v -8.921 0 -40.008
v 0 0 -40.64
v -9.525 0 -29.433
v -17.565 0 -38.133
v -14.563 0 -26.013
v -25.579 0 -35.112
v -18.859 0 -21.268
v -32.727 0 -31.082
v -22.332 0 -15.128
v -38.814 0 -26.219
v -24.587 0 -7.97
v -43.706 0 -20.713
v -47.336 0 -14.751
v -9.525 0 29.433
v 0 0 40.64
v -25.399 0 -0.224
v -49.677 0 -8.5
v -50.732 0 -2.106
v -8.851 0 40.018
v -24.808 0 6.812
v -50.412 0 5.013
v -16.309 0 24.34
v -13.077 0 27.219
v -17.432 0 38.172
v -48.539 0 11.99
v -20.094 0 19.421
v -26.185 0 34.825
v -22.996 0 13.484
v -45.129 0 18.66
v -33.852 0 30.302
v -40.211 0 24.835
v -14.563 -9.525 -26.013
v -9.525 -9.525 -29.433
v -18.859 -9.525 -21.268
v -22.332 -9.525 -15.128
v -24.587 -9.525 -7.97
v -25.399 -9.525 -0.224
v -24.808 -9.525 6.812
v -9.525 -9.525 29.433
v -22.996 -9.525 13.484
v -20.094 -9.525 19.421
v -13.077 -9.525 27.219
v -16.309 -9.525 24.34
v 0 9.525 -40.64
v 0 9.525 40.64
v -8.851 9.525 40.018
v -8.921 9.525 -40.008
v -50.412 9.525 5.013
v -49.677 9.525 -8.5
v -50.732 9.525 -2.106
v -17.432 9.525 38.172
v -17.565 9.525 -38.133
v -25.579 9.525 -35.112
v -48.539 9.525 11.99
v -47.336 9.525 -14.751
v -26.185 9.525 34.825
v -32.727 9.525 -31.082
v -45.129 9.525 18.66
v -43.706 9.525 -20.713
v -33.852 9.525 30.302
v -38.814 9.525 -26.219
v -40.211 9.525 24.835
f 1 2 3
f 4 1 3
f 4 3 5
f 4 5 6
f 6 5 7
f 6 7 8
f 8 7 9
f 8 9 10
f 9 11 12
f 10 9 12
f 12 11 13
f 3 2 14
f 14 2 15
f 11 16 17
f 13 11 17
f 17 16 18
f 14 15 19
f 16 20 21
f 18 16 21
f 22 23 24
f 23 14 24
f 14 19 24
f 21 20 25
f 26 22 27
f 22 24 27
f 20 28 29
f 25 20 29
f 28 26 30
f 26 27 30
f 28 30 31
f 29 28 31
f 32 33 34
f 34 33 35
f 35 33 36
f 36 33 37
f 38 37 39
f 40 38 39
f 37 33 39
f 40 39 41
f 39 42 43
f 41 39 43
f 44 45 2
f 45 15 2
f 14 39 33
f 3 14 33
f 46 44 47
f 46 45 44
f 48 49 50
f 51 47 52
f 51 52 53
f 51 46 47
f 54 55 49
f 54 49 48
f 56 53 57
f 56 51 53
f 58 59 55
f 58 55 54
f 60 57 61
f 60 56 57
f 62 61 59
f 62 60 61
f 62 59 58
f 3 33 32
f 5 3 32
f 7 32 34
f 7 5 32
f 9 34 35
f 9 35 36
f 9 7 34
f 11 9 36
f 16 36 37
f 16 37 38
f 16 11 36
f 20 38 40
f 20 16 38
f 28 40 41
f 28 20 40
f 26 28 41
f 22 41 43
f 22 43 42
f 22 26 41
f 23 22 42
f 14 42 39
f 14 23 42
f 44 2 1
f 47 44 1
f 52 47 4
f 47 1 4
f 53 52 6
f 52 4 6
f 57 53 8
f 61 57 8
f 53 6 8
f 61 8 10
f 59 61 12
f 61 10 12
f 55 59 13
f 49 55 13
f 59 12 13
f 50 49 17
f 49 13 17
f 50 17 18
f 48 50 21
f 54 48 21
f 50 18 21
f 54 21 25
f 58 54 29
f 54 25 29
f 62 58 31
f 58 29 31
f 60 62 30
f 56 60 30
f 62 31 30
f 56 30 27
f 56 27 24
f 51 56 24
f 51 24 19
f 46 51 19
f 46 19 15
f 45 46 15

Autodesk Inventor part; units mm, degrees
ref_plane "YZ Plane" through (0, 0, 0) normal (1, 0, 0) x (0, 1, 0)
ref_plane "XZ Plane" through (0, 0, 0) normal (0, 1, 0) x (-1, 0, 0)
ref_plane "XY Plane" through (0, 0, 0) normal (0, 0, 1) x (1, 0, 0)
sketch "Sketch1" plane through (0, 0, 0) normal (0, 1, 0) x (-1, 0, 0)
  ellipse E0 centre (0, 0) end of major axis (0, -40.64) minor radius 50.8 (0, -40.64) -> (0, 40.64) ccw
  line L0 (0, 40.64) -> (0, -40.64)
  ellipse E1 centre (0, 0) end of major axis (0, -31.75) minor radius 25.4 (0, -31.75) -> (0, 31.75) ccw
  line L1 (0, 40.64) -> (0, -40.64)
  point P0 (0, -31.75)
  point P1 (0, 31.75)
  dimension "d0" = 50.8
  dimension "d1" = 40.64
  dimension "d2" = 25.4
  dimension "d3" = 31.75
extrude "Extrusion1" add sketch "Sketch1" along normal blind 9.525
extrude "Extrusion2" add sketch "Sketch1" against normal blind 9.525 contours L0 E1
sketch "Sketch3" plane through (0, -9.525, 0) normal (0, -1, 0) x (1, 0, 0)
  line L0 (0, -31.75) -> (0, 31.75) projected
  ellipse E0 centre (0, 0) end of major axis (0, -31.75) minor radius 25.4 (0, 31.75) -> (0, -31.75) ccw projected
  line L1 (0, 40.64) -> (0, -40.64) projected
  ellipse E1 centre (0, 0) end of major axis (0, -31.75) minor radius 25.4 (0, 31.75) -> (0, -31.75) ccw projected
  line L2 (-9.525, 29.433) -> (-9.525, -29.433)
  ellipse E2 centre (0, 0) end of major axis (0, -31.75) minor radius 25.4 (0, 31.75) -> (-9.525, 29.433) ccw
  ellipse E3 centre (0, 0) end of major axis (0, -31.75) minor radius 25.4 (-9.525, -29.433) -> (0, -31.75) ccw
  point P0 (-9.525, -29.433)
  dimension "d8" = 9.525
extrude "Extrusion3" cut sketch "Sketch3" against normal blind 9.525 contours E0 L2 L0
properties part number "pryBarHolder"
